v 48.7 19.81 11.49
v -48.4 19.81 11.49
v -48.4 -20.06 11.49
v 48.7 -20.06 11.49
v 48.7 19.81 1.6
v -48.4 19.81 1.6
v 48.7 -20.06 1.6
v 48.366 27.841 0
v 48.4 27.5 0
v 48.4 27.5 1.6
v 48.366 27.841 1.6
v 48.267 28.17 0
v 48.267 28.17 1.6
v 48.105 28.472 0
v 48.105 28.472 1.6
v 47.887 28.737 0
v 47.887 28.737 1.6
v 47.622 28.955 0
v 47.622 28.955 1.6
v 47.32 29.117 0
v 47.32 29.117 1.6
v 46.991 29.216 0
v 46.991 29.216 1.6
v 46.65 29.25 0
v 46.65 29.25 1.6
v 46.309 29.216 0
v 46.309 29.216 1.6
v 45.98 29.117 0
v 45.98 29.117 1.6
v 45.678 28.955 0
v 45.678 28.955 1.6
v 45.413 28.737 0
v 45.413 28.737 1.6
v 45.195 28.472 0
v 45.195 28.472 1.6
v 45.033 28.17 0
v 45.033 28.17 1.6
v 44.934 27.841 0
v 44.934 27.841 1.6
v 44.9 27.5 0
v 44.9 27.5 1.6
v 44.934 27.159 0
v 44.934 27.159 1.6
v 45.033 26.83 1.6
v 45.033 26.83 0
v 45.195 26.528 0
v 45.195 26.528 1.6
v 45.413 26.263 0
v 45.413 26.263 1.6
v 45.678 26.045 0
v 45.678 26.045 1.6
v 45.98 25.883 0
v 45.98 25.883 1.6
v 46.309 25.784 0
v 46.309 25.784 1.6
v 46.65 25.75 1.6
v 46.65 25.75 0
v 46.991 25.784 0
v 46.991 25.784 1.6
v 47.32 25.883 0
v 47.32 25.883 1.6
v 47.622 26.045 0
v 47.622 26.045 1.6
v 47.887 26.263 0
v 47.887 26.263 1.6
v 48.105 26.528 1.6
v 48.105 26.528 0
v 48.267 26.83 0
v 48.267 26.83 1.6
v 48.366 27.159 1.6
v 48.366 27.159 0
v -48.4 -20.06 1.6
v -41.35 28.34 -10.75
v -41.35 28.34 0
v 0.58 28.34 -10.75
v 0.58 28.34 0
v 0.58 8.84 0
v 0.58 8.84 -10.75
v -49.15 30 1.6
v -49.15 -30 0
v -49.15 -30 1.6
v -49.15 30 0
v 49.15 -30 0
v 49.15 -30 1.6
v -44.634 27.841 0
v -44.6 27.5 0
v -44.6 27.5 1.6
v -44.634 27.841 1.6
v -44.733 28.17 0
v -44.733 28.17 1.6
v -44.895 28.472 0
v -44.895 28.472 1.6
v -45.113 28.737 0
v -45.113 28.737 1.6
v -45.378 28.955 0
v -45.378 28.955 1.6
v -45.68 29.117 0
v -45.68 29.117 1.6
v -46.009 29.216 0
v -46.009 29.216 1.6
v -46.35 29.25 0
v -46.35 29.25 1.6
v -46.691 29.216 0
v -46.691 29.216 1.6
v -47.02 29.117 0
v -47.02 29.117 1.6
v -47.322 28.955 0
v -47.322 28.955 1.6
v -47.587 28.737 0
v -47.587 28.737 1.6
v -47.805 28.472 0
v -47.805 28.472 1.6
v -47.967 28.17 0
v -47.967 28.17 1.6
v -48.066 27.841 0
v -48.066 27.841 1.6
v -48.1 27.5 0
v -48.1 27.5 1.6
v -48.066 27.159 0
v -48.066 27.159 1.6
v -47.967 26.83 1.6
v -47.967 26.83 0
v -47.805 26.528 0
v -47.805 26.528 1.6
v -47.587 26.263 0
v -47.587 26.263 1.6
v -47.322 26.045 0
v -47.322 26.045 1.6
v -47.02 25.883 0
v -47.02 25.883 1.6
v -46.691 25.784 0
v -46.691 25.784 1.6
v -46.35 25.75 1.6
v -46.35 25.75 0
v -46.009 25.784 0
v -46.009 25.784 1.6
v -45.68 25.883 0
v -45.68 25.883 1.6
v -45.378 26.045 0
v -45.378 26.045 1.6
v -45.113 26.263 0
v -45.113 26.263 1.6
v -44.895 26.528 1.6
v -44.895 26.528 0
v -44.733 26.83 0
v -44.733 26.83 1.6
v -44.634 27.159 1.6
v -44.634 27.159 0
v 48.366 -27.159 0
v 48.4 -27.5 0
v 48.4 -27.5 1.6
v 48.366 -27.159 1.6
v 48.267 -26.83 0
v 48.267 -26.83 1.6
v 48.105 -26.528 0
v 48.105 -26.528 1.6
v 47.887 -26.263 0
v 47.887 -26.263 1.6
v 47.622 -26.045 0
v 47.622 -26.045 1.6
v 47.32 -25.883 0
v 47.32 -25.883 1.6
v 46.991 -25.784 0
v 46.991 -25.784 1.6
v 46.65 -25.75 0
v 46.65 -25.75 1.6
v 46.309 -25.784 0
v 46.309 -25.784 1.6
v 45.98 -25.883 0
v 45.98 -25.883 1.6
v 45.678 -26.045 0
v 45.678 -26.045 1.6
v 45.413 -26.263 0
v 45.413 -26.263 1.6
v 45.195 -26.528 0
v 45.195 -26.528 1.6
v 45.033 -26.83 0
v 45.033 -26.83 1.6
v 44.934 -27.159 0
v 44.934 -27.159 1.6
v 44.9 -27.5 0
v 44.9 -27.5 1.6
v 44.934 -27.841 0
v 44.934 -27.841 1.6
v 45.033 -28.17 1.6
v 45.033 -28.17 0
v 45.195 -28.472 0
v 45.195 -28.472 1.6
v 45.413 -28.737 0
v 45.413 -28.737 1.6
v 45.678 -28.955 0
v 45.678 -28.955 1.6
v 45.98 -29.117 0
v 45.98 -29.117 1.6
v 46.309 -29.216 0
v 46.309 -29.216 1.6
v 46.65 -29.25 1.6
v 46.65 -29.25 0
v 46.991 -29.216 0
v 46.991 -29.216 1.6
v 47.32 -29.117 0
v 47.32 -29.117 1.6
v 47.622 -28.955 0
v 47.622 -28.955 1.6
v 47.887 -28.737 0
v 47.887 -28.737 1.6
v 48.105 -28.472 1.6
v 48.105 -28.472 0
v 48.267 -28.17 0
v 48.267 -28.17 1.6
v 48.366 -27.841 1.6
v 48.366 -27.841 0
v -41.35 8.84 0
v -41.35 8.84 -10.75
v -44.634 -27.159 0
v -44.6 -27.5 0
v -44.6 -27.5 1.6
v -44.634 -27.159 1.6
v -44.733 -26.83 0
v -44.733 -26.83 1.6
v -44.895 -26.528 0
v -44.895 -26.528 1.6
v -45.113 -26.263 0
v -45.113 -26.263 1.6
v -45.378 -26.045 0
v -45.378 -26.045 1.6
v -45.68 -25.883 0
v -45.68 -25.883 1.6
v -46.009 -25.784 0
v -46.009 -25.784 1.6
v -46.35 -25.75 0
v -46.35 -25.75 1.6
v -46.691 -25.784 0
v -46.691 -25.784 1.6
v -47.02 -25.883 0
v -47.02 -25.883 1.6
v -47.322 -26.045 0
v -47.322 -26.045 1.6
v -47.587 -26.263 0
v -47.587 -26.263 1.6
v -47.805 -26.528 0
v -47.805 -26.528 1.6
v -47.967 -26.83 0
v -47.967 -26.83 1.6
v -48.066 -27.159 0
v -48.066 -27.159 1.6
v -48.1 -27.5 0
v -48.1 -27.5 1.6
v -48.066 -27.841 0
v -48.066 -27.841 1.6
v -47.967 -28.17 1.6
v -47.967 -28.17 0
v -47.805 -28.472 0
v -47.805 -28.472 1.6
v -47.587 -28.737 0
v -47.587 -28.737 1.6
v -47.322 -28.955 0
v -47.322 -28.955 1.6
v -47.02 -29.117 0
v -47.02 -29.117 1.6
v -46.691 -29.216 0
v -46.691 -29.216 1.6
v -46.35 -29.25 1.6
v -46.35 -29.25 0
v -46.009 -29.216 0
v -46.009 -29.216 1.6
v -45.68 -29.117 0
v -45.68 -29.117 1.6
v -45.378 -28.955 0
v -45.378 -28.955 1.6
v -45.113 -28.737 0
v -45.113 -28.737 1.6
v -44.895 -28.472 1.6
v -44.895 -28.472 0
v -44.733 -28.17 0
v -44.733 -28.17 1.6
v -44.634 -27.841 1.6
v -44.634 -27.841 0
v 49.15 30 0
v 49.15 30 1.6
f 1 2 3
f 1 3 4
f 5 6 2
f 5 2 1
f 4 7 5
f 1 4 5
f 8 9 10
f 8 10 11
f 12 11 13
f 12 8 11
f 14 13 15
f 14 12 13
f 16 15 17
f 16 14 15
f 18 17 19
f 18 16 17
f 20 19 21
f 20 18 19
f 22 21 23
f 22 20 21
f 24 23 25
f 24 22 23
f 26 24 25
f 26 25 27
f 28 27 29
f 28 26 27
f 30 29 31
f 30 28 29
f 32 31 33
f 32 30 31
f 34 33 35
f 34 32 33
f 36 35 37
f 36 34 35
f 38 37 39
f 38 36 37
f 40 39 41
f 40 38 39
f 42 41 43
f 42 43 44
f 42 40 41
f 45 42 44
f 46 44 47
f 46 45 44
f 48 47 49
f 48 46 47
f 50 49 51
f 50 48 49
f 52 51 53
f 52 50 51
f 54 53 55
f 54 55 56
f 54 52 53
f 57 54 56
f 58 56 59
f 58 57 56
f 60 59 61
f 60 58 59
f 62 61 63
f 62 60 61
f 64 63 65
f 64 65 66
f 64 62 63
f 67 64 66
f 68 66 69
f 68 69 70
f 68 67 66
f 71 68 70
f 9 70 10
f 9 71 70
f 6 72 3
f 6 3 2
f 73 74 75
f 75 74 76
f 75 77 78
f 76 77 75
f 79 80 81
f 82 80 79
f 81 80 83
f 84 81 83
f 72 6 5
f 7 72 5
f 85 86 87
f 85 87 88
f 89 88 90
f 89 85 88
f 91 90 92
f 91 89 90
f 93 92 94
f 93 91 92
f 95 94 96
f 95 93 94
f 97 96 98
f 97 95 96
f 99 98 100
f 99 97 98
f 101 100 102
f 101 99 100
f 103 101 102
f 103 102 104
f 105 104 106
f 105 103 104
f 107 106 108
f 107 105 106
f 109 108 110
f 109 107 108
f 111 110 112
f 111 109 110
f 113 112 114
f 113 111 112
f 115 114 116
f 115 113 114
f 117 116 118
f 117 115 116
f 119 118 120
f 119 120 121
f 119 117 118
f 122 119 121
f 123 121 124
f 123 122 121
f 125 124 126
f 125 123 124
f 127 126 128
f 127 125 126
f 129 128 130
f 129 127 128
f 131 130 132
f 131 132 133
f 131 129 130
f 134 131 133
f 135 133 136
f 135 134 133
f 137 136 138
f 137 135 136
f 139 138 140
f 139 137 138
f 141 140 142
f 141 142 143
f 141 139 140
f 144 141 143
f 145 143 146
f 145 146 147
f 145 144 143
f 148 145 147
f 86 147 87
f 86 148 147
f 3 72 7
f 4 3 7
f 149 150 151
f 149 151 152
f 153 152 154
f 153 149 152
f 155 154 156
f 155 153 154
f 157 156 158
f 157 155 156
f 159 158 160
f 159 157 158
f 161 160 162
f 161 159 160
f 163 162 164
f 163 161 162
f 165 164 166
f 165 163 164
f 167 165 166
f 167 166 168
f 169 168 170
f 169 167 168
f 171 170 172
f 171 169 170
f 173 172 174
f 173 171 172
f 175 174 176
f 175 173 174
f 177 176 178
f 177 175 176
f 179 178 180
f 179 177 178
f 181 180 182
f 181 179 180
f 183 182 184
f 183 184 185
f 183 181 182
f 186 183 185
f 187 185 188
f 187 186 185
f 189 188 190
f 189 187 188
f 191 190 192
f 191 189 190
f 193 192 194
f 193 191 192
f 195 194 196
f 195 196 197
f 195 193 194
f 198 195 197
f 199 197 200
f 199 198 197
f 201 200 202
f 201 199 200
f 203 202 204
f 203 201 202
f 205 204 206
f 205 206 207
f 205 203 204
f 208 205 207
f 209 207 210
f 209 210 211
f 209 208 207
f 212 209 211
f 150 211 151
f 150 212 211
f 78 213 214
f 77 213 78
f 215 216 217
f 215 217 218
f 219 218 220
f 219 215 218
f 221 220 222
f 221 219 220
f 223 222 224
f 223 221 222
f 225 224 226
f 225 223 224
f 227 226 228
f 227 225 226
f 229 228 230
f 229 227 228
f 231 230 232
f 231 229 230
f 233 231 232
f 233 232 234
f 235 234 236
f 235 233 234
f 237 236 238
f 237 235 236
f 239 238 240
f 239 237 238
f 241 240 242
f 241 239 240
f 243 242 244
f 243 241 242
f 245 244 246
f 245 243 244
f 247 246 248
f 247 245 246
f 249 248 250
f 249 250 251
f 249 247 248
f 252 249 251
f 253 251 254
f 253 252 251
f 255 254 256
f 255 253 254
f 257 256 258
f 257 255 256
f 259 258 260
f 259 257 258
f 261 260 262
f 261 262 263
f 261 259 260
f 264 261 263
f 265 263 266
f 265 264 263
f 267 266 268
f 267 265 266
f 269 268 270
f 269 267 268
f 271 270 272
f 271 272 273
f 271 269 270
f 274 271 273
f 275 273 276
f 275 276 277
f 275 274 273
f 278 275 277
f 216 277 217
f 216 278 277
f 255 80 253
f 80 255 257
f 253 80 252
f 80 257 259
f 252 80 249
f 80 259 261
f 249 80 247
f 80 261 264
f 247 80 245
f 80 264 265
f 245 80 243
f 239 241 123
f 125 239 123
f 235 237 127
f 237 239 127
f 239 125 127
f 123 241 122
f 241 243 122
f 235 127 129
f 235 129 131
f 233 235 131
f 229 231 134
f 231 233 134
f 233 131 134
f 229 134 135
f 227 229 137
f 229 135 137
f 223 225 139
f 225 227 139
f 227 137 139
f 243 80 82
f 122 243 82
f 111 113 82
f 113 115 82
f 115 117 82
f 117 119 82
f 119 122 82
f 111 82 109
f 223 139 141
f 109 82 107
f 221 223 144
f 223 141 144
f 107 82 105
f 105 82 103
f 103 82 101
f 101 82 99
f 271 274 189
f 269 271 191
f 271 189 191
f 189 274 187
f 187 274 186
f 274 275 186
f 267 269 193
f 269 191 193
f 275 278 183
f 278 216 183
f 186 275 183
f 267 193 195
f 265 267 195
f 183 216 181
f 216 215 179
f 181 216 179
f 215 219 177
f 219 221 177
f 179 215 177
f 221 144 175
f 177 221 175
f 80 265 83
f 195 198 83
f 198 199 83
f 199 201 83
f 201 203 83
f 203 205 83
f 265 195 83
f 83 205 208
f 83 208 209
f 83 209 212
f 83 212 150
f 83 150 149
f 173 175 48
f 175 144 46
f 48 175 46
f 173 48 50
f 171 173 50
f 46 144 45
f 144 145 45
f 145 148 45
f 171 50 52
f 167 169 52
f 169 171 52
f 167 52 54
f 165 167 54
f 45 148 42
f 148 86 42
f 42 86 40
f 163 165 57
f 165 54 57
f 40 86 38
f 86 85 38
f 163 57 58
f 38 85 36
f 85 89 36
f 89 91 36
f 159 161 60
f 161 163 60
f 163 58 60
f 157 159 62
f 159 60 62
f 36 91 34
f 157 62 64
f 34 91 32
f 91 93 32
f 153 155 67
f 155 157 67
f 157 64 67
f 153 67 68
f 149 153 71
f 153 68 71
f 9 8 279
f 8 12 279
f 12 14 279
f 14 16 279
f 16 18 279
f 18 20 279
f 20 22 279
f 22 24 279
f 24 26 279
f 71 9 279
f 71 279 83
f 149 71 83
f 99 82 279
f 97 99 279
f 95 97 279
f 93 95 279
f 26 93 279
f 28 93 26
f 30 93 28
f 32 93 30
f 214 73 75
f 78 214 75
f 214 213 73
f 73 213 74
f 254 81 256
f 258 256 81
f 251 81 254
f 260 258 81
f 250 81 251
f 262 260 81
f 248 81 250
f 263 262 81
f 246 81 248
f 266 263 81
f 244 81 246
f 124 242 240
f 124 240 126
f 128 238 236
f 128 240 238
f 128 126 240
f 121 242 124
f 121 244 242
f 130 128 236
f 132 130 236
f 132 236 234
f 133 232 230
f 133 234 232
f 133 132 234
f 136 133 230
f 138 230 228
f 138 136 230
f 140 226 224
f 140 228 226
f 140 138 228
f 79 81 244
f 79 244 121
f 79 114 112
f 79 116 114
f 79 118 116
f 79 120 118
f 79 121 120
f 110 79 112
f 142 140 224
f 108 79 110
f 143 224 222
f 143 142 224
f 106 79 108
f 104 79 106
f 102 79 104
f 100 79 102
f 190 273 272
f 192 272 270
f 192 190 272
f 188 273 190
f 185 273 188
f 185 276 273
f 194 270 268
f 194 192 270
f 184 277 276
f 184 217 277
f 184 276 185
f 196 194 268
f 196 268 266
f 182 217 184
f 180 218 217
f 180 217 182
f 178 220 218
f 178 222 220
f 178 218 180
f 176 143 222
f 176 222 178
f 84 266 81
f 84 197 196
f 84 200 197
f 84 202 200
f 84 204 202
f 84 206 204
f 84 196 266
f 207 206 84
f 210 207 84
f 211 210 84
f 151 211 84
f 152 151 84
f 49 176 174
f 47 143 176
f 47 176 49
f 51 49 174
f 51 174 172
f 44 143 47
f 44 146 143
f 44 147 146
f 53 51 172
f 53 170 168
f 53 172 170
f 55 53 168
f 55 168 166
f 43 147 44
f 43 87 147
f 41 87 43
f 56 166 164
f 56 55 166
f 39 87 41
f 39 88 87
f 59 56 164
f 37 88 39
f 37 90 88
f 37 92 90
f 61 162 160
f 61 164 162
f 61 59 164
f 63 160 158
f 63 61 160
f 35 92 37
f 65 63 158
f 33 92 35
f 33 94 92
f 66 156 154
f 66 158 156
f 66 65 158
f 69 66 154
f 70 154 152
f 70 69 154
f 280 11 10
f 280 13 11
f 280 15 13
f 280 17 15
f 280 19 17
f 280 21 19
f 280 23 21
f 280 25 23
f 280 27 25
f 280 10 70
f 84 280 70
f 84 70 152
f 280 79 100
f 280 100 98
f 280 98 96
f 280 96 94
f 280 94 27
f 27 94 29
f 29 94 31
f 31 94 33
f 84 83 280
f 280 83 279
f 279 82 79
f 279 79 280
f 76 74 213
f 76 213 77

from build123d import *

# Parameters (mm, degrees)
F0_W     = 98.3
F0_H     = 60
F0_R     = 1.75
F1_DEPTH = 1.6
F2_W     = 97.1
F2_H     = 39.87
F3_DEPTH = 9.89
F4_W     = 41.93
F4_H     = 19.5
F5_DEPTH = 10.75


# Not quite as in the source:
# - a feature names something its author has since deleted; it is built from what else it names


with BuildPart() as f1:
    # F0 (on Top) → F1 (new body)
    with BuildSketch(Plane.XY):
        Rectangle(F0_W, F0_H)
        with Locations((-46.35, -27.5)):
            Circle(F0_R, mode=Mode.SUBTRACT)
        with Locations((46.65, -27.5)):
            Circle(F0_R, mode=Mode.SUBTRACT)
        with Locations((-46.35, 27.5)):
            Circle(F0_R, mode=Mode.SUBTRACT)
        with Locations((46.65, 27.5)):
            Circle(F0_R, mode=Mode.SUBTRACT)
    extrude(amount=F1_DEPTH)


with BuildPart() as f3:
    # F2 (on face) → F3 (new body)
    with BuildSketch(Plane.XY.offset(1.6)):
        with Locations((0.15, -0.125)):
            Rectangle(F2_W, F2_H)
    extrude(amount=F3_DEPTH)


with BuildPart() as f5:
    # F4 (on face) → F5 (new body)
    with BuildSketch(Plane.XY):
        with Locations((-20.385, 18.59)):
            Rectangle(F4_W, F4_H)
    extrude(amount=-F5_DEPTH)


solid = Compound([f1.part, f3.part, f5.part])
